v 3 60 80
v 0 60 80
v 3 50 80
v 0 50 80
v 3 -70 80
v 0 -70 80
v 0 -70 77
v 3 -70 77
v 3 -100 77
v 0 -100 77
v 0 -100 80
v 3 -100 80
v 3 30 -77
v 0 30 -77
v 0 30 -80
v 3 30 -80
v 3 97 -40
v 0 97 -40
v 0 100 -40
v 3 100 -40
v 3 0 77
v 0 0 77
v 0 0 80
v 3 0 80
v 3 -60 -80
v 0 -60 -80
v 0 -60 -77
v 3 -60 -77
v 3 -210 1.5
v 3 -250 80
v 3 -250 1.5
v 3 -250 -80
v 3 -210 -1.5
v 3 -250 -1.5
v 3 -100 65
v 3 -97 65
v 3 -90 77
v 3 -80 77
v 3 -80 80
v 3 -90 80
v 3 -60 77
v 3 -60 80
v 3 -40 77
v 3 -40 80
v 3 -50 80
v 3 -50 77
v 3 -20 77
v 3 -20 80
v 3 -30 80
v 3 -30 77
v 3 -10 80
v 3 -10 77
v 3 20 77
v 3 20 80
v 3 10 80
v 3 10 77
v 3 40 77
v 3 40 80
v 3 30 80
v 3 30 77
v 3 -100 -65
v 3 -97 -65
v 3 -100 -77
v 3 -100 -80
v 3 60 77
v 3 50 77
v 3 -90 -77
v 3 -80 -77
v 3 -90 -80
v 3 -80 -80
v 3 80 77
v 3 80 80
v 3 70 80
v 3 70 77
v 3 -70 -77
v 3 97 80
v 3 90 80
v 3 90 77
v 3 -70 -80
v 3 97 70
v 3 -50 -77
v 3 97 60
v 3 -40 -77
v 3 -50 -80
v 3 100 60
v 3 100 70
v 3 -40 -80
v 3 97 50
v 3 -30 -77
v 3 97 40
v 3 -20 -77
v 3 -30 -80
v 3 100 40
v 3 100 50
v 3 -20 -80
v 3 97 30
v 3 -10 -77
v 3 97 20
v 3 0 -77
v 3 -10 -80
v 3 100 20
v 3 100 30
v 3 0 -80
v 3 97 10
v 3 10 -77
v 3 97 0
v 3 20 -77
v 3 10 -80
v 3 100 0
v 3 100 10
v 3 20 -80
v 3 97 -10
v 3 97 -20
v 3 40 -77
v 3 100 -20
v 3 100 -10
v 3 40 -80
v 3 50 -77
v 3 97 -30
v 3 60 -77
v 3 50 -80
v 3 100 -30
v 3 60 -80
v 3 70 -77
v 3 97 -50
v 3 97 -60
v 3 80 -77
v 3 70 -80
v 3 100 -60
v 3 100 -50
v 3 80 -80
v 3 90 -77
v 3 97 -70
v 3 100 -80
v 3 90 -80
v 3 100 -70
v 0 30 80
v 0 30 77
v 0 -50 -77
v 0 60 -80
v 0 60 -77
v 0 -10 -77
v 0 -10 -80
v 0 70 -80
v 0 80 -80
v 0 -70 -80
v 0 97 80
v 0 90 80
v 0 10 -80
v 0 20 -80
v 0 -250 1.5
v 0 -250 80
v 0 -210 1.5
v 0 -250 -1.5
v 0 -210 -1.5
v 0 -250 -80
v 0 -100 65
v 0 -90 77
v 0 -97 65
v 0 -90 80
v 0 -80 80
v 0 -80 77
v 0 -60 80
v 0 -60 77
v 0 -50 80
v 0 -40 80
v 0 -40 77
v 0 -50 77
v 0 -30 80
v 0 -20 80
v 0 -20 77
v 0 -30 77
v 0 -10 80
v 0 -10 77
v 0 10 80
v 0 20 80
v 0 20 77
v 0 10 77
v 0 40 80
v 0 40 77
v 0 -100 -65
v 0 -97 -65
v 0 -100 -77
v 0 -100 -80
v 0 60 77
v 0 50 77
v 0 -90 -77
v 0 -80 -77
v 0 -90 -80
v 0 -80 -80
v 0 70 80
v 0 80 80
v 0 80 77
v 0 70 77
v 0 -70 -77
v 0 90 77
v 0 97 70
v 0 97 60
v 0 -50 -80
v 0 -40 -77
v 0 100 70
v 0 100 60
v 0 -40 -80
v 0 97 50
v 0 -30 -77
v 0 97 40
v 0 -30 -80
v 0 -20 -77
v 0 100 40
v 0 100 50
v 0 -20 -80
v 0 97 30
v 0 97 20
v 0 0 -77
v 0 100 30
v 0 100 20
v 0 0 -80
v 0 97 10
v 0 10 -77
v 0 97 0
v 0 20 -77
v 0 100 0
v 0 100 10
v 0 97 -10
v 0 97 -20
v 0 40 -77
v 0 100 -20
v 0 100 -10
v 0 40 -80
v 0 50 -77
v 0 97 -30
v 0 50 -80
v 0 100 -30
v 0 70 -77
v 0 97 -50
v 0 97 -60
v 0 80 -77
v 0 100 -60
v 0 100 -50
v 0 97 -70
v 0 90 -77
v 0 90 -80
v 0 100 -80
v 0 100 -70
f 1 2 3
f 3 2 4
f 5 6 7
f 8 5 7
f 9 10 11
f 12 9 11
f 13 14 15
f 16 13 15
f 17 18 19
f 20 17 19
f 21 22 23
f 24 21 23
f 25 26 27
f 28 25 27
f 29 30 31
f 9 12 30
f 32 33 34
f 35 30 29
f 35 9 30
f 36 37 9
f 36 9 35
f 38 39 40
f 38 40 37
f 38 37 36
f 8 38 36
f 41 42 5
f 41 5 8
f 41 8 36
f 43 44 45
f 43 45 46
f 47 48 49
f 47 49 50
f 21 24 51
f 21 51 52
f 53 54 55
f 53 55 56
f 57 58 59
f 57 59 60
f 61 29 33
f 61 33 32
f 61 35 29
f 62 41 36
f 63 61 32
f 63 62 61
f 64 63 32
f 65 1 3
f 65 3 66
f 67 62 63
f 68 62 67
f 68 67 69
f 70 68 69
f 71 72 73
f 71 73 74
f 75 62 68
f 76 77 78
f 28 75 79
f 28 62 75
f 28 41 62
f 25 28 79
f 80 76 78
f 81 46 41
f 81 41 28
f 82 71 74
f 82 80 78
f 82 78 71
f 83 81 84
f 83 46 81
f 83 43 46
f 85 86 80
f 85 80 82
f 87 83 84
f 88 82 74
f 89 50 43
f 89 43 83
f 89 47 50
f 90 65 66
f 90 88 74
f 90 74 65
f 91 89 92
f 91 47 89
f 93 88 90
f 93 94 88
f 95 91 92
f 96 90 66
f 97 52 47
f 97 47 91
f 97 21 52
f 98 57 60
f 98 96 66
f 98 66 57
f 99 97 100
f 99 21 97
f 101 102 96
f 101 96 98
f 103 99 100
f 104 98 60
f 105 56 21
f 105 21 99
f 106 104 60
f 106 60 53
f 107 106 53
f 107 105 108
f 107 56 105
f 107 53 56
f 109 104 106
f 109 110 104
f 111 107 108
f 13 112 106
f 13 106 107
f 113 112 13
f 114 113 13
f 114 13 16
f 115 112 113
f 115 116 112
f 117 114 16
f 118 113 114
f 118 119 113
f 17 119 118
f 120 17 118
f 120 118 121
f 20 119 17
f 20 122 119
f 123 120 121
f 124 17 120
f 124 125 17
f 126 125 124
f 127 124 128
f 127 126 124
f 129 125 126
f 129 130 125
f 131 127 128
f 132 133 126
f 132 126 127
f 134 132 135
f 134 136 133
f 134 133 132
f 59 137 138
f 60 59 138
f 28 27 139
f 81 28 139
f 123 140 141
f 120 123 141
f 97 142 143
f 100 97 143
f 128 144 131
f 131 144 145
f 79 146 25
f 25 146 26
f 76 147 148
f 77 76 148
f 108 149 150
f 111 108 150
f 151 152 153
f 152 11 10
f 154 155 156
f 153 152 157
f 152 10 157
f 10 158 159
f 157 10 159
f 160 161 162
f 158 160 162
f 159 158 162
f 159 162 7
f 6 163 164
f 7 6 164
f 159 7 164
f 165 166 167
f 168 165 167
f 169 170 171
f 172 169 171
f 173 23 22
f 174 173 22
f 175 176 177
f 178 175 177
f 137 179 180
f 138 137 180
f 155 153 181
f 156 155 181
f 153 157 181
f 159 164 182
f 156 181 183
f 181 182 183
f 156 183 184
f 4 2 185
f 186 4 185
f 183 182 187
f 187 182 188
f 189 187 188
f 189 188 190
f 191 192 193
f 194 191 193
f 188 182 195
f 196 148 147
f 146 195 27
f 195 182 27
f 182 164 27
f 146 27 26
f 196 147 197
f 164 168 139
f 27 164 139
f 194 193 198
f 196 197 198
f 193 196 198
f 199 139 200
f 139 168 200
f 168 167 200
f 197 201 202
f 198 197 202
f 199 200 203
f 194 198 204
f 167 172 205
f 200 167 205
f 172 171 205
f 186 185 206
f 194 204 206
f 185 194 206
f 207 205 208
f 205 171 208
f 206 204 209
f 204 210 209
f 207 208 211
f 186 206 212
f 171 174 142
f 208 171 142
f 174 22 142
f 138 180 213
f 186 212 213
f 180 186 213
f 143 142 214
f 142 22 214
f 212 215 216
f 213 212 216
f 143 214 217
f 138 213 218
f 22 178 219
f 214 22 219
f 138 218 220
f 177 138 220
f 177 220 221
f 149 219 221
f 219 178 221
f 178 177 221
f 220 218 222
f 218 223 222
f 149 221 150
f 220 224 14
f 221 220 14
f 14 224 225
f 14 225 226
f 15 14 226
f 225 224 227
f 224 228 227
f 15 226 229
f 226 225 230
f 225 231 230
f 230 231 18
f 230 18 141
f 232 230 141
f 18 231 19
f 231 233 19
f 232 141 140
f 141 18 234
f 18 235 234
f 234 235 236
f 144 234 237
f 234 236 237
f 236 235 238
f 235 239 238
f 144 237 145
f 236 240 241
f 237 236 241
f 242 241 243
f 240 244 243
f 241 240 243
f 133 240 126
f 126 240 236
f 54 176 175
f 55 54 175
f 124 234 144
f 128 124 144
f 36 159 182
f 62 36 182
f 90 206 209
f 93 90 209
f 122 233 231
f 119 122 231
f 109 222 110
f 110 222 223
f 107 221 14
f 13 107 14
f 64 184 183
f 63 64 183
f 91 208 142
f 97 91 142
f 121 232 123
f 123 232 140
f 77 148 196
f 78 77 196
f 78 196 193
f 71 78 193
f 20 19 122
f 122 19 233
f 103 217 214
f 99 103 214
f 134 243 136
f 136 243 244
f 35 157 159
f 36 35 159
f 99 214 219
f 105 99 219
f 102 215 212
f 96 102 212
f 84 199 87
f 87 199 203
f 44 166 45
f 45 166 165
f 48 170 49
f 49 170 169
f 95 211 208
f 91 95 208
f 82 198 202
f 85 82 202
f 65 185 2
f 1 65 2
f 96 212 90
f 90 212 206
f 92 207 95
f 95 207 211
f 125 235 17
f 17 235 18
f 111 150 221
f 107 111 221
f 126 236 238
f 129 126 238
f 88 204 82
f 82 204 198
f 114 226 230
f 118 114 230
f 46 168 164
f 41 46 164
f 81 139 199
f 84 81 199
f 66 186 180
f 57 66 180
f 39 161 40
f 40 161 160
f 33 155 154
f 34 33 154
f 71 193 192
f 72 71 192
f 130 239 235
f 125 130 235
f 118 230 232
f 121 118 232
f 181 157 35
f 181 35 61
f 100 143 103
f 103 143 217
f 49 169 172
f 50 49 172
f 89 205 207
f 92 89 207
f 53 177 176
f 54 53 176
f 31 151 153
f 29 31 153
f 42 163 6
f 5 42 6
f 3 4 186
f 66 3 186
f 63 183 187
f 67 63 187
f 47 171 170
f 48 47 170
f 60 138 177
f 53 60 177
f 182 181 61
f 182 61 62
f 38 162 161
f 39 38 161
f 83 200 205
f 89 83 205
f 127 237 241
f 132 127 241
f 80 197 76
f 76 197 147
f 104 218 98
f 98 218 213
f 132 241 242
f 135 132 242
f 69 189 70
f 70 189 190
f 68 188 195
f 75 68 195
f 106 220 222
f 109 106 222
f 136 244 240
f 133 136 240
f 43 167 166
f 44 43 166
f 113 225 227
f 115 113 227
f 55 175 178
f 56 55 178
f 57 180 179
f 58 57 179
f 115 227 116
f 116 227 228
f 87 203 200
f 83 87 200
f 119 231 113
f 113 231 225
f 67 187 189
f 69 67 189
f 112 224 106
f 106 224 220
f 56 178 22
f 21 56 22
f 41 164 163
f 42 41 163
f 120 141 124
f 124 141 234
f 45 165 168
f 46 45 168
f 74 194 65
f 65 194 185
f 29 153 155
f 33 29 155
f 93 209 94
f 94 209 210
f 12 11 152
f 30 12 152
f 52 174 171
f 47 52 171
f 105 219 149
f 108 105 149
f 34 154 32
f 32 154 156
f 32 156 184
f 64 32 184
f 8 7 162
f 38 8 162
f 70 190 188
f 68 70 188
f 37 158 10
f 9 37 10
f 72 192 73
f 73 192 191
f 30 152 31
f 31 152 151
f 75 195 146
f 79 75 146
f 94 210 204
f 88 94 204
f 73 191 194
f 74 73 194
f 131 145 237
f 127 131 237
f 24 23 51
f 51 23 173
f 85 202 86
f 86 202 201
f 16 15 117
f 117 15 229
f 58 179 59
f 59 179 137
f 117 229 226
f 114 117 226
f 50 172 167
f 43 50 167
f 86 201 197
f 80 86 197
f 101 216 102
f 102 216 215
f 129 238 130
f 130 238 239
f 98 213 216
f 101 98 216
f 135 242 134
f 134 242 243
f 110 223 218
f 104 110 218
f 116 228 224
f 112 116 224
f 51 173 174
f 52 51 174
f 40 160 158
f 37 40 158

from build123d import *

# Parameters (mm, degrees)
CROQUIS1_W              = 130
CROQUIS1_H              = 3
SALIENTE_EXTRUIR1_DEPTH = 3


with BuildPart() as part:
    # Croquis1 → Saliente-Extruir1 (new body)
    with BuildSketch(Plane(origin=(0, 0, 0), x_dir=(0, 0, -1), z_dir=(1, 0, 0))):
        Polygon((-80.00000142, -80), (-80.00000142, -90), (-77.00000142, -90), (-77.000027229, -100), (-80, -100), (-80, -250), (-1.5, -250), (-1.5, -210), (1.5, -210), (1.5, -250), (80, -250), (80, -100), (77.000027229, -100), (77.00000142, -90), (80.00000142, -90), (80.00000142, -80), (77.000019468, -80), (77.000001401, -70.000000014), (80.000001401, -70.000000014), (80.000001401, -60.000000014), (77.000019449, -60.000000014), (77.000001383, -50.000000028), (80.000001383, -50.000000028), (80.000001383, -40.000000028), (77.000019431, -40.000000028), (77.000001365, -30.000000042), (80.000001365, -30.000000042), (80.000001365, -20.000000042), (77.000019412, -20.000000042), (77.000001346, -10.000000056), (80.000001346, -10.000000056), (80.000001346, -5.6e-08), (77.000019394, -5.6e-08), (77.000001328, 9.99999993), (80.000001328, 9.99999993), (80.000001328, 19.99999993), (77.000019376, 19.99999993), (77.00000131, 29.999999916), (80.00000131, 29.999999916), (80.00000131, 39.999999916), (77.000019357, 39.999999916), (77.000001291, 49.999999903), (80.000001291, 49.999999903), (80.000001291, 59.999999903), (77.000019339, 59.999999903), (77.000001273, 69.999999889), (80.000001273, 69.999999889), (80.000001273, 79.999999889), (77.000019321, 79.999999889), (77.000001254, 90), (80, 90), (80, 97), (80, 100), (70, 100), (70, 97), (60, 97), (60, 100), (50, 100), (50, 97), (40, 97), (40, 100), (30, 100), (30, 97), (20, 97), (20, 100), (10, 100), (10, 97), (0, 97), (0, 100), (-10, 100), (-10, 97), (-20, 97), (-20, 100), (-30, 100), (-30, 97), (-40, 97), (-40, 100), (-50, 100), (-50, 97), (-60, 97), (-60, 100), (-70, 100), (-70, 97), (-80, 97), (-80, 90), (-77.000001254, 90), (-77.000019321, 79.999999889), (-80.000001273, 79.999999889), (-80.000001273, 69.999999889), (-77.000001273, 69.999999889), (-77.000019339, 59.999999903), (-80.000001291, 59.999999903), (-80.000001291, 49.999999903), (-77.000001291, 49.999999903), (-77.000019357, 39.999999916), (-80.00000131, 39.999999916), (-80.00000131, 29.999999916), (-77.00000131, 29.999999916), (-77.000019376, 19.99999993), (-80.000001328, 19.99999993), (-80.000001328, 9.99999993), (-77.000001328, 9.99999993), (-77.000019394, -5.6e-08), (-80.000001346, -5.6e-08), (-80.000001346, -10.000000056), (-77.000001346, -10.000000056), (-77.000019412, -20.000000042), (-80.000001365, -20.000000042), (-80.000001365, -30.000000042), (-77.000001365, -30.000000042), (-77.000019431, -40.000000028), (-80.000001383, -40.000000028), (-80.000001383, -50.000000028), (-77.000001383, -50.000000028), (-77.000019449, -60.000000014), (-80.000001401, -60.000000014), (-80.000001401, -70.000000014), (-77.000001401, -70.000000014), (-77.000019468, -80), align=None)
        with Locations((0, -98.5)):
            Rectangle(CROQUIS1_W, CROQUIS1_H, mode=Mode.SUBTRACT)
    extrude(amount=SALIENTE_EXTRUIR1_DEPTH)


solid = part.part
